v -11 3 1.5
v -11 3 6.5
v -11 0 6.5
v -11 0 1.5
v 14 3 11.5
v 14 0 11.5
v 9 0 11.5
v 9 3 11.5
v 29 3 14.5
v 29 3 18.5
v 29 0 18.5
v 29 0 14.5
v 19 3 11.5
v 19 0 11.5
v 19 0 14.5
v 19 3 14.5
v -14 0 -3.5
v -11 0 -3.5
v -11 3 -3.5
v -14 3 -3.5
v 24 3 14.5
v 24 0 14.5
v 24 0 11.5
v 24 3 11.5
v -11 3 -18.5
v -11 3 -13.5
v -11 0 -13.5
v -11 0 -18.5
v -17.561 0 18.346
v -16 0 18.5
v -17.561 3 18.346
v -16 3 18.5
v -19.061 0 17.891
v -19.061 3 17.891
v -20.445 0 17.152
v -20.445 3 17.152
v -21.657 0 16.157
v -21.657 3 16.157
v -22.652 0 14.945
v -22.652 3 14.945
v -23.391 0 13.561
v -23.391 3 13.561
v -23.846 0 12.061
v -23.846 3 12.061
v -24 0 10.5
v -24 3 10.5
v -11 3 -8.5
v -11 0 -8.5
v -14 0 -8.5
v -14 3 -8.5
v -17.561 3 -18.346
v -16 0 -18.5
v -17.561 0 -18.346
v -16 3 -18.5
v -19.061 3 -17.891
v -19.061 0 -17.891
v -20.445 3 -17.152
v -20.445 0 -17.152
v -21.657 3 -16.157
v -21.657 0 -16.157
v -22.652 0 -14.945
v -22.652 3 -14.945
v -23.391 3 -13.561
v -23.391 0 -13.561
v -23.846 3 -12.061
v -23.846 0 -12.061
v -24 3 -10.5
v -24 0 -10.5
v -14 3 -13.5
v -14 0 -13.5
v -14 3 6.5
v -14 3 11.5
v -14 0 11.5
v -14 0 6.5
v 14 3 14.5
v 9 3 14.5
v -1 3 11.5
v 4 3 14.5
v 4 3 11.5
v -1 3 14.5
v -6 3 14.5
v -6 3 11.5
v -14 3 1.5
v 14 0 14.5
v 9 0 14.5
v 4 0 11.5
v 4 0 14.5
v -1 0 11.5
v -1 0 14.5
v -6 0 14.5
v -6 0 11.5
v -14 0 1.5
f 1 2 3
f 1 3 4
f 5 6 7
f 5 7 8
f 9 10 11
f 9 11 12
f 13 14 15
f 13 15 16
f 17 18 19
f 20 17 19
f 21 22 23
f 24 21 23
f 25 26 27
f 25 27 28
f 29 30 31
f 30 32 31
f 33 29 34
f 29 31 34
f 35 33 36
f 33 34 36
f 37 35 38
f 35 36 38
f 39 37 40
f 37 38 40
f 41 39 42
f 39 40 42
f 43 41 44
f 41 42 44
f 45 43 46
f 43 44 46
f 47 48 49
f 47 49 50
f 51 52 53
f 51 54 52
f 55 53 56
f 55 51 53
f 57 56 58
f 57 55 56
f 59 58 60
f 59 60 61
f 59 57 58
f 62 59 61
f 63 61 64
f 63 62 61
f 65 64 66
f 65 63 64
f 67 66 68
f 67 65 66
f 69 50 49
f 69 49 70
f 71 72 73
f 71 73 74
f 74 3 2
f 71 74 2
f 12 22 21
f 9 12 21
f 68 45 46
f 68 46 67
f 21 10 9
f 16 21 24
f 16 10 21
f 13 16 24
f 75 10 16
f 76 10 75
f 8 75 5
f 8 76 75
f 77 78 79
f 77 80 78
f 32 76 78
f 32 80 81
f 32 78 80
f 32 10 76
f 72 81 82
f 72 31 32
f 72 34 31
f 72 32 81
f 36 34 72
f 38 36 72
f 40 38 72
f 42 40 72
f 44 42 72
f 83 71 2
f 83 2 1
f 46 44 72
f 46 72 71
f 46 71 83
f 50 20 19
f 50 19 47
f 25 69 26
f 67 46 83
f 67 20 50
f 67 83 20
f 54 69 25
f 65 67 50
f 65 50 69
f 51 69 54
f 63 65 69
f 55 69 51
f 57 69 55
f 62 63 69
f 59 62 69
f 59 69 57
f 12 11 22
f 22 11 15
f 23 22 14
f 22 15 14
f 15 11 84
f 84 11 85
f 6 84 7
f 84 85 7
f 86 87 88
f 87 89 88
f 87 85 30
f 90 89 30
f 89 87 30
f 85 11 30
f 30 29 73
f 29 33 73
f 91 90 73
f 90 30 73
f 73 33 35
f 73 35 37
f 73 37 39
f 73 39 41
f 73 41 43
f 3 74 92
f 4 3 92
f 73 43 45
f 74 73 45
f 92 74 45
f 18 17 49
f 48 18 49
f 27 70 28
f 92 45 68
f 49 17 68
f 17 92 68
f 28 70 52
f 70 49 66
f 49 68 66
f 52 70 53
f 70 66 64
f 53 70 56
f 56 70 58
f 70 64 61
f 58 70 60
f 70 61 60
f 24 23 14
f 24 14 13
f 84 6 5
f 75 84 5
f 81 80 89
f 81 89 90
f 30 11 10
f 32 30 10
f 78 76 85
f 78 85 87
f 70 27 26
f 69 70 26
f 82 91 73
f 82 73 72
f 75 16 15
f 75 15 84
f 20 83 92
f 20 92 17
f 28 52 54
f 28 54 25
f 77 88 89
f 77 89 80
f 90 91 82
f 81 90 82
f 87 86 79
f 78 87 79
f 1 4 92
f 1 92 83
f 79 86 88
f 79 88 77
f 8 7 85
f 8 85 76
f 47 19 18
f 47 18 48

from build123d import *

# Parameters (mm, degrees)
SKETCH1_W           = 48
SKETCH1_H           = 37
BOSS_EXTRUDE1_DEPTH = 3
SKETCH3_W           = 35
SKETCH3_H           = 30
CUT_EXTRUDE1_DEPTH  = 3
SKETCH5_W           = 5
SKETCH5_H           = 3
CUT_EXTRUDE2_DEPTH  = 3
SKETCH4_W           = 5
SKETCH4_H           = 3
CUT_EXTRUDE3_DEPTH  = 3
SKETCH6_W           = 4
SKETCH6_H           = 3
BOSS_EXTRUDE2_DEPTH = 5
FILLET2_R           = 8


with BuildPart() as part:
    # Sketch1 → Boss-Extrude1 (new body)
    with BuildSketch(Plane(origin=(0, 0, 0), x_dir=(1, 0, 0), z_dir=(0, 1, 0))):
        Rectangle(SKETCH1_W, SKETCH1_H)
    extrude(amount=BOSS_EXTRUDE1_DEPTH)

    # Sketch3 → Cut-Extrude1 (cut)
    with BuildSketch(Plane(origin=(0, 3, 0), x_dir=(1, 0, 0), z_dir=(0, 1, 0))):
        with Locations((6.5, 3.5)):
            Rectangle(SKETCH3_W, SKETCH3_H)
    extrude(amount=-CUT_EXTRUDE1_DEPTH, mode=Mode.SUBTRACT)

    # Sketch5 → Cut-Extrude2 (cut)
    with BuildSketch(Plane(origin=(-11, 0, 0), x_dir=(0, 0, -1), z_dir=(1, 0, 0))):
        with Locations((11, 1.5)):
            Rectangle(SKETCH5_W, SKETCH5_H)
        with Locations((1, 1.5)):
            Rectangle(SKETCH5_W, SKETCH5_H)
        with Locations((-9, 1.5)):
            Rectangle(SKETCH5_W, SKETCH5_H)
    extrude(amount=-CUT_EXTRUDE2_DEPTH, mode=Mode.SUBTRACT)

    # Sketch4 → Cut-Extrude3 (cut)
    with BuildSketch(Plane(origin=(0, 0, 11.5), x_dir=(-1, 0, 0), z_dir=(0, 0, -1))):
        with Locations((-16.5, 1.5)):
            Rectangle(SKETCH4_W, SKETCH4_H)
        with Locations((-6.5, 1.5)):
            Rectangle(SKETCH4_W, SKETCH4_H)
        with Locations((3.5, 1.5)):
            Rectangle(SKETCH4_W, SKETCH4_H)
    extrude(amount=-CUT_EXTRUDE3_DEPTH, mode=Mode.SUBTRACT)

    # Sketch6 → Boss-Extrude2 (add)
    with BuildSketch(Plane(origin=(24, 0, 0), x_dir=(0, 0, -1), z_dir=(1, 0, 0))):
        with Locations((-16.5, 1.5)):
            Rectangle(SKETCH6_W, SKETCH6_H)
    extrude(amount=BOSS_EXTRUDE2_DEPTH)

    # Fillet2
    fillet2_edges = [part.edges().sort_by_distance(p)[0] for p in [
        (-24, 1.5, 18.5),
        (-24, 1.5, -18.5),
    ]]
    fillet(fillet2_edges, radius=FILLET2_R)


solid = part.part
